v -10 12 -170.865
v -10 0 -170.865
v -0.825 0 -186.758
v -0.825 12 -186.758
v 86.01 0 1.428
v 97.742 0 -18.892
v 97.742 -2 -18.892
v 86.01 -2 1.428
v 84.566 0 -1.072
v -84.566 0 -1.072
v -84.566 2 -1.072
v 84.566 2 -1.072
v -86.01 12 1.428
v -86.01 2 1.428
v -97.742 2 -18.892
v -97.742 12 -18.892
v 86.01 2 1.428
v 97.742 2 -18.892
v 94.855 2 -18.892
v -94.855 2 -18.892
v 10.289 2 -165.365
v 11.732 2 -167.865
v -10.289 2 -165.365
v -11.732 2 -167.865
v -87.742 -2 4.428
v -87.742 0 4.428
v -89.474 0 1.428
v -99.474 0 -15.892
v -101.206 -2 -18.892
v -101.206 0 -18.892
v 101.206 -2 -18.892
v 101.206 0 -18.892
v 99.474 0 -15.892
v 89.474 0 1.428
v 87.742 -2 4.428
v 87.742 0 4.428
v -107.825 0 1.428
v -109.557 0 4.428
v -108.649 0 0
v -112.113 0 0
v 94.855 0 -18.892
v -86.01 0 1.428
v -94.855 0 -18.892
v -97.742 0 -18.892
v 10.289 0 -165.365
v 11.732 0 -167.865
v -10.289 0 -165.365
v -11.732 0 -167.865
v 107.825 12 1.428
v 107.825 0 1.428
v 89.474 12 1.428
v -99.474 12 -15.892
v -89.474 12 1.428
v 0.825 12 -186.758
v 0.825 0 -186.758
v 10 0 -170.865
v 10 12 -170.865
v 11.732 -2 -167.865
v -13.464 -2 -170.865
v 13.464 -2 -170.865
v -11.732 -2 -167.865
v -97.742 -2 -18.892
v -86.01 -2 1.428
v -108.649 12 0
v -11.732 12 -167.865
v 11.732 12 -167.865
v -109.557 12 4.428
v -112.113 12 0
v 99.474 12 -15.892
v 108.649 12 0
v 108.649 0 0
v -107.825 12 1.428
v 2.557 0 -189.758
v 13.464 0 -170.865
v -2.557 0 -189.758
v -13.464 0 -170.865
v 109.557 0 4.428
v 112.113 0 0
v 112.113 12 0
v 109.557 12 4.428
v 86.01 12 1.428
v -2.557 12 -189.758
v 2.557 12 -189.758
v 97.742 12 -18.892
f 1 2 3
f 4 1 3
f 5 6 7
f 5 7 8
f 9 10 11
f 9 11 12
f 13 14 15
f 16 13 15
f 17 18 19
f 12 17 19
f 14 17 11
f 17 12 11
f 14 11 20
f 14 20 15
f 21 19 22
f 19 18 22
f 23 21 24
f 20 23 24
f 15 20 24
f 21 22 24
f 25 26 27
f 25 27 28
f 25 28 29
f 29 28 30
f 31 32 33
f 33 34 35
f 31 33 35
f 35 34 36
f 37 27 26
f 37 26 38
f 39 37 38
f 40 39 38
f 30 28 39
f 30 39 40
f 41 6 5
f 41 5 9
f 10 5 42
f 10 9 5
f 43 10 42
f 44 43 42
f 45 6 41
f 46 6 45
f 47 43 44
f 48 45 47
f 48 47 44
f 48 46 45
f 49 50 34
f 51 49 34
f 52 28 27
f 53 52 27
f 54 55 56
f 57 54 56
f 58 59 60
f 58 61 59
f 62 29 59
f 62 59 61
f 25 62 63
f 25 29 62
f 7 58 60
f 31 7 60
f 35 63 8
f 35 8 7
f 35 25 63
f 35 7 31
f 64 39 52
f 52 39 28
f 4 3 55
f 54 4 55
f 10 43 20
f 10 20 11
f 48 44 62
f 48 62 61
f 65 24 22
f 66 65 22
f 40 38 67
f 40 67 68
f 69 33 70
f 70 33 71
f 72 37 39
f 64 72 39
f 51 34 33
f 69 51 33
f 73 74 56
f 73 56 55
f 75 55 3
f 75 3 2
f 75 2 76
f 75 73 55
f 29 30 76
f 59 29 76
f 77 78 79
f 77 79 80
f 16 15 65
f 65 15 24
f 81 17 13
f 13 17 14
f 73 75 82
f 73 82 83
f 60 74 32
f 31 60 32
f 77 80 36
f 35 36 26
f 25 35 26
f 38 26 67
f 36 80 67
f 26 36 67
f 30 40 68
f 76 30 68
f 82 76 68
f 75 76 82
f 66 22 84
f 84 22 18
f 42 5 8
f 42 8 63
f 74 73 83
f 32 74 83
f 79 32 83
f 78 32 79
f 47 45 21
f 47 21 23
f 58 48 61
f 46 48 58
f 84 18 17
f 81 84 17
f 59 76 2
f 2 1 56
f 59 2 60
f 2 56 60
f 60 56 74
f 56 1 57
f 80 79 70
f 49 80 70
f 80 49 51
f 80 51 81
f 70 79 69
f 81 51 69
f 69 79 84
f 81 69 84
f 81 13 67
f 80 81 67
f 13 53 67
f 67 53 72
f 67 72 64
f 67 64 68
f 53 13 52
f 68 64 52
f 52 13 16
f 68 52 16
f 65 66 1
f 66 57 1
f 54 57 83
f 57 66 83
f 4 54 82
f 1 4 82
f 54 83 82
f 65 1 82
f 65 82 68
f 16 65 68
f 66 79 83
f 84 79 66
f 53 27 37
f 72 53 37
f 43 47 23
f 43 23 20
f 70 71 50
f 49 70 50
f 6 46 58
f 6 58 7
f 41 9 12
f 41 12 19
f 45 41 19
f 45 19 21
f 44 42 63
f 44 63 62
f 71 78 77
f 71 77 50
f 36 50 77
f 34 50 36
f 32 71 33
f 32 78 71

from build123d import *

# Parameters (mm, degrees)
BOSS_EXTRUDE1_DEPTH = 12
BOSS_EXTRUDE2_DEPTH = 2
BOSS_EXTRUDE3_DEPTH = 2


with BuildPart() as part:
    # Sketch1 → Boss-Extrude1 (new body)
    with BuildSketch(Plane(origin=(0, 0, 0), x_dir=(1, 0, 0), z_dir=(0, 1, 0))):
        Polygon((109.556624327, -4.42820323), (-109.556624327, -4.42820323), (-112.113248654, 0), (-2.556624327, 189.75763964), (2.556624327, 189.75763964), (112.113248654, 0), align=None)
        Polygon((-107.824573519, -1.42820323), (-108.649147039, 0), (-99.473720558, 15.892304845), (-89.473720558, -1.42820323), align=None, mode=Mode.SUBTRACT)
        Polygon((-0.824573519, 186.75763964), (0.824573519, 186.75763964), (10, 170.865334795), (-10, 170.865334795), align=None, mode=Mode.SUBTRACT)
        Polygon((108.649147039, 0), (107.824573519, -1.42820323), (89.473720558, -1.42820323), (99.473720558, 15.892304845), align=None, mode=Mode.SUBTRACT)
        Polygon((-11.732050808, 167.865334795), (11.732050808, 167.865334795), (97.741669751, 18.892304845), (86.009618943, -1.42820323), (-86.009618943, -1.42820323), (-97.741669751, 18.892304845), align=None, mode=Mode.SUBTRACT)
    extrude(amount=BOSS_EXTRUDE1_DEPTH)

    # Sketch1<4> → Boss-Extrude2 (add)
    with BuildSketch(Plane(origin=(0, 0, 0), x_dir=(1, 0, 0), z_dir=(0, 1, 0))):
        Polygon((11.732050808, 167.865334795), (-11.732050808, 167.865334795), (-97.741669751, 18.892304845), (-86.009618943, -1.42820323), (86.009618943, -1.42820323), (97.741669751, 18.892304845), align=None)
        Polygon((84.56624327, 1.07179677), (-84.56624327, 1.07179677), (-94.854918405, 18.892304845), (-10.288675135, 165.365334795), (10.288675135, 165.365334795), (94.854918405, 18.892304845), align=None, mode=Mode.SUBTRACT)
    extrude(amount=BOSS_EXTRUDE2_DEPTH)

    # Sketch2 → Boss-Extrude3 (add)
    with BuildSketch(Plane.XZ):
        Polygon((101.205771366, -18.892304845), (87.741669751, 4.42820323), (-87.741669751, 4.42820323), (-101.205771366, -18.892304845), (-13.464101615, -170.865334795), (13.464101615, -170.865334795), align=None)
        Polygon((-11.732050807, -167.865334795), (11.732050807, -167.865334795), (97.741669751, -18.892304845), (86.009618943, 1.42820323), (-86.009618943, 1.42820323), (-97.741669751, -18.892304845), align=None, mode=Mode.SUBTRACT)
    extrude(amount=BOSS_EXTRUDE3_DEPTH)


solid = part.part
